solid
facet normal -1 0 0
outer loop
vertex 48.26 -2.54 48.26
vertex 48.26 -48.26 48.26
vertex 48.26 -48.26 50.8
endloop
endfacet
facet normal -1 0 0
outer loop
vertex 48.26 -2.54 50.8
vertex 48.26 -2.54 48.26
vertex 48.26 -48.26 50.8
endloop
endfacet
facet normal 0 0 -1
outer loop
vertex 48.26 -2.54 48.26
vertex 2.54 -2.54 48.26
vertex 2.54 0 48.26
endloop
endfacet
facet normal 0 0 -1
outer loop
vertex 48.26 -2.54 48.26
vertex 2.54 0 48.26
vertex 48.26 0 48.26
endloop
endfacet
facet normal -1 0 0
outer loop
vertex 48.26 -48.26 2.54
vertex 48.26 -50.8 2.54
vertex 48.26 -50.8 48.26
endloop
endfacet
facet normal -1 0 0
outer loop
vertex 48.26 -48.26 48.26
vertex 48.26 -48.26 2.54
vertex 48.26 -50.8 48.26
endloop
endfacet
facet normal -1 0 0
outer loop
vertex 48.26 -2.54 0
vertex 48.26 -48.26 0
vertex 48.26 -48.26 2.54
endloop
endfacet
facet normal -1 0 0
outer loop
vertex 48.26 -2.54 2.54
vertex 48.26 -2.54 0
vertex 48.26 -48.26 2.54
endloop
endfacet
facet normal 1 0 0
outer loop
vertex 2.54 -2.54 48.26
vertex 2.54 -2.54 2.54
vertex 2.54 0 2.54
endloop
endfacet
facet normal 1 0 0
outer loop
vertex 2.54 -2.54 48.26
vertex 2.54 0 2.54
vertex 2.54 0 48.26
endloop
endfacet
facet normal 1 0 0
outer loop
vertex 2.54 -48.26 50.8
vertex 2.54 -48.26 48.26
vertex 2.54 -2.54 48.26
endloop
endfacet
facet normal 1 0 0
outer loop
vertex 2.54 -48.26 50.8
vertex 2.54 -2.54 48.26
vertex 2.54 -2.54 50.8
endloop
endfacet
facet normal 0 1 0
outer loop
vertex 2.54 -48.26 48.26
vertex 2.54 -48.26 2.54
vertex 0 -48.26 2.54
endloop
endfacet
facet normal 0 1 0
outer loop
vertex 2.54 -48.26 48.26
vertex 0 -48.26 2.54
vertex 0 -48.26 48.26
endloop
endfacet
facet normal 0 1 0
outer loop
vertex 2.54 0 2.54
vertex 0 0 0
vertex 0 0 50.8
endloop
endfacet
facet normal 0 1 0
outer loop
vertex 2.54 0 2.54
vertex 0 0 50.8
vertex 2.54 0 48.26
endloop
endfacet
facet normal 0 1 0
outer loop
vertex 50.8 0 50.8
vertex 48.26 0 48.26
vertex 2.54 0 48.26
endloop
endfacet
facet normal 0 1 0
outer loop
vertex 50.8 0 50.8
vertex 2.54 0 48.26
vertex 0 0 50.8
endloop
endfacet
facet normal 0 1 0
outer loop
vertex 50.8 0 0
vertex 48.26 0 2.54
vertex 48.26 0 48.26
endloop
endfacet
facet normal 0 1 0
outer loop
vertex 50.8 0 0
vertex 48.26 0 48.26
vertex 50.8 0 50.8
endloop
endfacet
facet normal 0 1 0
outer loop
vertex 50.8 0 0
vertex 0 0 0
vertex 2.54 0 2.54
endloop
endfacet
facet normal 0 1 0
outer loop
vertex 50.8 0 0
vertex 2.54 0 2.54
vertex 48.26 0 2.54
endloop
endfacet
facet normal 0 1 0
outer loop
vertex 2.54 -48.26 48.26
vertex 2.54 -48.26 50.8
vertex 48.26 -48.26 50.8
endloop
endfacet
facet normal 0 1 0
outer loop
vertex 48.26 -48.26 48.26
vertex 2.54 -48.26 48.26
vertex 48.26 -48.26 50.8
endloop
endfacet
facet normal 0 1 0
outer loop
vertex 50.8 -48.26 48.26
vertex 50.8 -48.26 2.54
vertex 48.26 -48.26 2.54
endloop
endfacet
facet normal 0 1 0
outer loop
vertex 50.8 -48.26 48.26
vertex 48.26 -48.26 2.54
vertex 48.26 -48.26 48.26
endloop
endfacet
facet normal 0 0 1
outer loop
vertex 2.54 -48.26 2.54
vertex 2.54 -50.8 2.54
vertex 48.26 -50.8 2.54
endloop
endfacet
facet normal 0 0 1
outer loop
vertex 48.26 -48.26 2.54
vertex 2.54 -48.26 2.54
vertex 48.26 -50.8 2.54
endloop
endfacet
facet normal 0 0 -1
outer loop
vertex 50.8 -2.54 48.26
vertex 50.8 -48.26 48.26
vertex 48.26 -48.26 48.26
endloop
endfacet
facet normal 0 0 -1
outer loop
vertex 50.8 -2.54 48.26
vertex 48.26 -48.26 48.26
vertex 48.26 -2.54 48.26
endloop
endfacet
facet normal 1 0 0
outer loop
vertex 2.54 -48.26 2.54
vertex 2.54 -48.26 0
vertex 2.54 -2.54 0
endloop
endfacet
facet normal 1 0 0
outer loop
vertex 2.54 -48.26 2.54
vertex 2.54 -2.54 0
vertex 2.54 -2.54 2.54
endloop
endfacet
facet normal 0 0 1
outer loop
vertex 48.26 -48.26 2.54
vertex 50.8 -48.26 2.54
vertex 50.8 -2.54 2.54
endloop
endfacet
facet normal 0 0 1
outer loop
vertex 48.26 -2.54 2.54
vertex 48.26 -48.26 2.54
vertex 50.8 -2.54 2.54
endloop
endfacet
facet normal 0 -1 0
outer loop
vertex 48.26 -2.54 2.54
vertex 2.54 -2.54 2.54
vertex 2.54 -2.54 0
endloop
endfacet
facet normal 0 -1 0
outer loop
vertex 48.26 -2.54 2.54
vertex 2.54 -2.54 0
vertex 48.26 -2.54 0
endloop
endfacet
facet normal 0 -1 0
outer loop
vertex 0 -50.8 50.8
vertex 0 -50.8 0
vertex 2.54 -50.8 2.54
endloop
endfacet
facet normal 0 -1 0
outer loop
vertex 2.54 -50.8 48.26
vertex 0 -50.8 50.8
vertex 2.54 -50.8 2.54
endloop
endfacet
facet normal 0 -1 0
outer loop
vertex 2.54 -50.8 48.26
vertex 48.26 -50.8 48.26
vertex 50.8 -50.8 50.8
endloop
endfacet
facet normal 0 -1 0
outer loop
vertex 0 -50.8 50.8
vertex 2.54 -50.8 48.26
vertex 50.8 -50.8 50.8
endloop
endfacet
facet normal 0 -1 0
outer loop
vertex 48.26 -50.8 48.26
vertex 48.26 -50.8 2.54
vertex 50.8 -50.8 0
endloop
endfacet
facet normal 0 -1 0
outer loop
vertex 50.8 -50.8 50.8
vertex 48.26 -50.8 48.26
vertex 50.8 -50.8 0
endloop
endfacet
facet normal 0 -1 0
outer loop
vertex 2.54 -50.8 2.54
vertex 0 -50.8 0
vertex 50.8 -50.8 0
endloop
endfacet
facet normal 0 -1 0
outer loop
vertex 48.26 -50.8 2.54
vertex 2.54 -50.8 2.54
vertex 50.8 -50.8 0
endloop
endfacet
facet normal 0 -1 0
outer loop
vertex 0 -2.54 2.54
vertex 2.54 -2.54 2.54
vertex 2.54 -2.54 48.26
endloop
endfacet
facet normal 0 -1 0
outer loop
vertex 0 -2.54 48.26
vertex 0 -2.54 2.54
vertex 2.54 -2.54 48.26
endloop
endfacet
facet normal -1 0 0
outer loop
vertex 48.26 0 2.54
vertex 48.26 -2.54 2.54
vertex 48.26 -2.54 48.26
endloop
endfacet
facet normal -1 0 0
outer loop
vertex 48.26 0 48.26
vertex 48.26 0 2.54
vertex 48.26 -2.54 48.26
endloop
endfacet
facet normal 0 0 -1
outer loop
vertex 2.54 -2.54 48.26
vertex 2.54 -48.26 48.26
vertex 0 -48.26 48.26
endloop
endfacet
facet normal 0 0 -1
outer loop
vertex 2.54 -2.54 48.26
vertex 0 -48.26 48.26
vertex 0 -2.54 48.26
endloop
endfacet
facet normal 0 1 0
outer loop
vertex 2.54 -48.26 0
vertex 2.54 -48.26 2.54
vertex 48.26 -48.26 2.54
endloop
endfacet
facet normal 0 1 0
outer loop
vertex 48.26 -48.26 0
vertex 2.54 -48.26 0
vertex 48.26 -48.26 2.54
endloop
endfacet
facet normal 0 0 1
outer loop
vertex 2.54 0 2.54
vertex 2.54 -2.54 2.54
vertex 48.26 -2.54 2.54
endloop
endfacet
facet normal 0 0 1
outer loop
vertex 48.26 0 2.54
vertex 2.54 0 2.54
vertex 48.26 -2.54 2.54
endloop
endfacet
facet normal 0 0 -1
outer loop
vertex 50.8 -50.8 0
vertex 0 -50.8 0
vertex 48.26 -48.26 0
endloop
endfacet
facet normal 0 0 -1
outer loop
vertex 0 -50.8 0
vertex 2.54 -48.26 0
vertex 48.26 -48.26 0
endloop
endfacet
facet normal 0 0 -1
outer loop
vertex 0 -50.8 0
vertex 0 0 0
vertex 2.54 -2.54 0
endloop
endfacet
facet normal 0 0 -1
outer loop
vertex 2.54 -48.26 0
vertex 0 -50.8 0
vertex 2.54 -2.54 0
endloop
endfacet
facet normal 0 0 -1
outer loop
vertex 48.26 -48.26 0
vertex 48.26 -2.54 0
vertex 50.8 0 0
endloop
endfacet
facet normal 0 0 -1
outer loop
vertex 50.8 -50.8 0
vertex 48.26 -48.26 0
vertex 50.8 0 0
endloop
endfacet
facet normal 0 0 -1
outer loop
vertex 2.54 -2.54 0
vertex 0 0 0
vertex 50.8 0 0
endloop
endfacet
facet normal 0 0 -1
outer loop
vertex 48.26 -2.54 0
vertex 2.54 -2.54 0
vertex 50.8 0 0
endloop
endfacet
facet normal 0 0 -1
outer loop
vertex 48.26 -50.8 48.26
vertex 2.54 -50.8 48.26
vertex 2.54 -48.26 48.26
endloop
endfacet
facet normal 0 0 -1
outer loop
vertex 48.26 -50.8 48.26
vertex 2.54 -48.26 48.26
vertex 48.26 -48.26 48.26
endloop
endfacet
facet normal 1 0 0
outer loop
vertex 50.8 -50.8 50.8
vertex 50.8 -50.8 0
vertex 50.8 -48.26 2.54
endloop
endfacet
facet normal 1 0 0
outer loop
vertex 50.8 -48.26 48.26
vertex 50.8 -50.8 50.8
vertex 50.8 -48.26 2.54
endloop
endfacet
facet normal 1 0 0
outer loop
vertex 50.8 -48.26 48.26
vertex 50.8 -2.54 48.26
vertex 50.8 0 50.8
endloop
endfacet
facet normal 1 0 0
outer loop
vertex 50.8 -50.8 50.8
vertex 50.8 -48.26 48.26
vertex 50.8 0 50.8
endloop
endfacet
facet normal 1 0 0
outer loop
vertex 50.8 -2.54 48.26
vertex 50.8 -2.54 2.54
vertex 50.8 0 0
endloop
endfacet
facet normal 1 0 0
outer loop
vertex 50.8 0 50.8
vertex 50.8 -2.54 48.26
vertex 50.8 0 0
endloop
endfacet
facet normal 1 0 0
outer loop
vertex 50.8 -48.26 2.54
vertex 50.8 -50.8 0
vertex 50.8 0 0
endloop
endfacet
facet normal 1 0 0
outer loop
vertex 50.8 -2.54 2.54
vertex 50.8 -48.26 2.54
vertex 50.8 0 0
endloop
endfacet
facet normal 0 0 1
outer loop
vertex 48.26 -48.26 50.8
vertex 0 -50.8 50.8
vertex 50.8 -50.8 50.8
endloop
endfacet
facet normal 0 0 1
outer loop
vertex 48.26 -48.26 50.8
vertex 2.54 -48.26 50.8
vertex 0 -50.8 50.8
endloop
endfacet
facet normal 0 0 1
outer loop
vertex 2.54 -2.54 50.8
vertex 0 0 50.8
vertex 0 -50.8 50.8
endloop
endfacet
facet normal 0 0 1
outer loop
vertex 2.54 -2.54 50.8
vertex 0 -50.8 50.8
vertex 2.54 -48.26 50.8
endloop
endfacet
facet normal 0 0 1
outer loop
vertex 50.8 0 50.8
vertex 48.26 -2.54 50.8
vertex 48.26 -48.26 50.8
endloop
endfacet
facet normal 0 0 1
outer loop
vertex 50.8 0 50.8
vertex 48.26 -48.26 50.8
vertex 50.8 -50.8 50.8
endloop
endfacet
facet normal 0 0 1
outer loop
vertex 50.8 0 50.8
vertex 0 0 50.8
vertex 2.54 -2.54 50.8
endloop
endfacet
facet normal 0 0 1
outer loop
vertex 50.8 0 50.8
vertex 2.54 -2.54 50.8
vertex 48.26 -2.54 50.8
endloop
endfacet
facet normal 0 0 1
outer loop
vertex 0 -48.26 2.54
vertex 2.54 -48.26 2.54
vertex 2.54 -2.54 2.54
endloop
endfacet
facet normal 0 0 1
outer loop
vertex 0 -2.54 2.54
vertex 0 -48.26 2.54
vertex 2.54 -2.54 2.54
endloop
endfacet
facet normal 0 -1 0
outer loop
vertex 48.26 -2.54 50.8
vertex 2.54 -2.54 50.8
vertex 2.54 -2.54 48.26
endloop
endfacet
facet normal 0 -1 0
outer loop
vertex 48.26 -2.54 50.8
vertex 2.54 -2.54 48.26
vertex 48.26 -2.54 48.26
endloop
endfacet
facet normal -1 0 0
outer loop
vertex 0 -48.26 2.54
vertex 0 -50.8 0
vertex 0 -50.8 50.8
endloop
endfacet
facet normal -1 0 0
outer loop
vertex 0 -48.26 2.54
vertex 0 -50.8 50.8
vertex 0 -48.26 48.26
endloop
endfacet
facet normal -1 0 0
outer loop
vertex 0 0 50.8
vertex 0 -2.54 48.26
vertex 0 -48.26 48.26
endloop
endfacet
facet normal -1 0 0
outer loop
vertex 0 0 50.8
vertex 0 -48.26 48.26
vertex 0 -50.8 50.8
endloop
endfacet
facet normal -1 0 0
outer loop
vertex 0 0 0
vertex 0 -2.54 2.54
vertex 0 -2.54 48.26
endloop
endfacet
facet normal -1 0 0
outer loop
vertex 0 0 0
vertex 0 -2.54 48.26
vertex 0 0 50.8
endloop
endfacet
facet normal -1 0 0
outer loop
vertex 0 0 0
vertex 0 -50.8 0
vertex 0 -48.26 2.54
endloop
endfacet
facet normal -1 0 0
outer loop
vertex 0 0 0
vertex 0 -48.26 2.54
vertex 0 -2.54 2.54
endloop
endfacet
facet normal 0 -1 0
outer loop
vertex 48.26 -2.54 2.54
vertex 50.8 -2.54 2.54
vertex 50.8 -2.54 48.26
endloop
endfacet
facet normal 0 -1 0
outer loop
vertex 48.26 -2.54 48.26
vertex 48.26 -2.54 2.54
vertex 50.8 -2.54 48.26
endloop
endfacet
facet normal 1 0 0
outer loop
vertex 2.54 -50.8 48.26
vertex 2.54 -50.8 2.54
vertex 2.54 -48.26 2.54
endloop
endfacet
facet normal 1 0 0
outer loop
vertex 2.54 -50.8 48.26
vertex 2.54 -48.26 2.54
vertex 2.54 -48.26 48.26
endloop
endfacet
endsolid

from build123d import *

# Parameters (mm, degrees)
F0_W     = 50.8
F0_H     = 50.8
F1_DEPTH = 50.8
F2_W     = 45.72
F2_H     = 45.72
F3_DEPTH = 50.8
F4_W     = 45.72
F4_H     = 45.72
F5_DEPTH = 50.8
F6_W     = 45.72
F6_H     = 45.72
F7_DEPTH = 50.8


with BuildPart() as f1:
    # F0 (on Top) → F1 (new body)
    with BuildSketch(Plane.XY):
        with Locations((25.4, -25.4)):
            Rectangle(F0_W, F0_H)
    extrude(amount=F1_DEPTH)

    # F2 (on face) → F3 (cut)
    with BuildSketch(Plane.XY.offset(50.8)):
        with Locations((25.4, -25.4)):
            Rectangle(F2_W, F2_H)
    extrude(amount=-F3_DEPTH, mode=Mode.SUBTRACT)

    # F4 (on face) → F5 (cut)
    with BuildSketch(Plane.XZ.offset(50.8)):
        with Locations((25.4, 25.4)):
            Rectangle(F4_W, F4_H)
    extrude(amount=-F5_DEPTH, mode=Mode.SUBTRACT)

    # F6 (on face) → F7 (cut)
    with BuildSketch(Plane.YZ.offset(50.8)):
        with Locations((-25.4, 25.4)):
            Rectangle(F6_W, F6_H)
    extrude(amount=-F7_DEPTH, mode=Mode.SUBTRACT)


solid = f1.part
